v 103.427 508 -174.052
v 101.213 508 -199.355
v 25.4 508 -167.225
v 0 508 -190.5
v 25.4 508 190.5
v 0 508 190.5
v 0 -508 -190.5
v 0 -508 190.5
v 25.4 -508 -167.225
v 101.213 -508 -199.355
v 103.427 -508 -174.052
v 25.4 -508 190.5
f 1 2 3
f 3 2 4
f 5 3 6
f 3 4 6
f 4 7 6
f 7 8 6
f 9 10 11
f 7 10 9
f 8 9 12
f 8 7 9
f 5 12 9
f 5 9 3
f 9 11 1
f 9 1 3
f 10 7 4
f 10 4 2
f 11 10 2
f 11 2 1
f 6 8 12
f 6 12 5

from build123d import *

# Parameters (mm, degrees)
F0_W     = 1016
F0_H     = 381
F1_DEPTH = 25.4
F3_DEPTH = 1016


with BuildPart() as f1:
    # F0 (on Right) → F1 (new body)
    with BuildSketch(Plane.YZ):
        Rectangle(F0_W, F0_H)
    extrude(amount=F1_DEPTH)

    # F2 (on face) → F3 (join, through all)
    with BuildSketch(Plane.XZ.offset(508)):
        Polygon((0, -165.002976), (0, -190.5), (101.213381, -199.355023), (103.427137, -174.051678), align=None)
    extrude(amount=-F3_DEPTH)


solid = f1.part
